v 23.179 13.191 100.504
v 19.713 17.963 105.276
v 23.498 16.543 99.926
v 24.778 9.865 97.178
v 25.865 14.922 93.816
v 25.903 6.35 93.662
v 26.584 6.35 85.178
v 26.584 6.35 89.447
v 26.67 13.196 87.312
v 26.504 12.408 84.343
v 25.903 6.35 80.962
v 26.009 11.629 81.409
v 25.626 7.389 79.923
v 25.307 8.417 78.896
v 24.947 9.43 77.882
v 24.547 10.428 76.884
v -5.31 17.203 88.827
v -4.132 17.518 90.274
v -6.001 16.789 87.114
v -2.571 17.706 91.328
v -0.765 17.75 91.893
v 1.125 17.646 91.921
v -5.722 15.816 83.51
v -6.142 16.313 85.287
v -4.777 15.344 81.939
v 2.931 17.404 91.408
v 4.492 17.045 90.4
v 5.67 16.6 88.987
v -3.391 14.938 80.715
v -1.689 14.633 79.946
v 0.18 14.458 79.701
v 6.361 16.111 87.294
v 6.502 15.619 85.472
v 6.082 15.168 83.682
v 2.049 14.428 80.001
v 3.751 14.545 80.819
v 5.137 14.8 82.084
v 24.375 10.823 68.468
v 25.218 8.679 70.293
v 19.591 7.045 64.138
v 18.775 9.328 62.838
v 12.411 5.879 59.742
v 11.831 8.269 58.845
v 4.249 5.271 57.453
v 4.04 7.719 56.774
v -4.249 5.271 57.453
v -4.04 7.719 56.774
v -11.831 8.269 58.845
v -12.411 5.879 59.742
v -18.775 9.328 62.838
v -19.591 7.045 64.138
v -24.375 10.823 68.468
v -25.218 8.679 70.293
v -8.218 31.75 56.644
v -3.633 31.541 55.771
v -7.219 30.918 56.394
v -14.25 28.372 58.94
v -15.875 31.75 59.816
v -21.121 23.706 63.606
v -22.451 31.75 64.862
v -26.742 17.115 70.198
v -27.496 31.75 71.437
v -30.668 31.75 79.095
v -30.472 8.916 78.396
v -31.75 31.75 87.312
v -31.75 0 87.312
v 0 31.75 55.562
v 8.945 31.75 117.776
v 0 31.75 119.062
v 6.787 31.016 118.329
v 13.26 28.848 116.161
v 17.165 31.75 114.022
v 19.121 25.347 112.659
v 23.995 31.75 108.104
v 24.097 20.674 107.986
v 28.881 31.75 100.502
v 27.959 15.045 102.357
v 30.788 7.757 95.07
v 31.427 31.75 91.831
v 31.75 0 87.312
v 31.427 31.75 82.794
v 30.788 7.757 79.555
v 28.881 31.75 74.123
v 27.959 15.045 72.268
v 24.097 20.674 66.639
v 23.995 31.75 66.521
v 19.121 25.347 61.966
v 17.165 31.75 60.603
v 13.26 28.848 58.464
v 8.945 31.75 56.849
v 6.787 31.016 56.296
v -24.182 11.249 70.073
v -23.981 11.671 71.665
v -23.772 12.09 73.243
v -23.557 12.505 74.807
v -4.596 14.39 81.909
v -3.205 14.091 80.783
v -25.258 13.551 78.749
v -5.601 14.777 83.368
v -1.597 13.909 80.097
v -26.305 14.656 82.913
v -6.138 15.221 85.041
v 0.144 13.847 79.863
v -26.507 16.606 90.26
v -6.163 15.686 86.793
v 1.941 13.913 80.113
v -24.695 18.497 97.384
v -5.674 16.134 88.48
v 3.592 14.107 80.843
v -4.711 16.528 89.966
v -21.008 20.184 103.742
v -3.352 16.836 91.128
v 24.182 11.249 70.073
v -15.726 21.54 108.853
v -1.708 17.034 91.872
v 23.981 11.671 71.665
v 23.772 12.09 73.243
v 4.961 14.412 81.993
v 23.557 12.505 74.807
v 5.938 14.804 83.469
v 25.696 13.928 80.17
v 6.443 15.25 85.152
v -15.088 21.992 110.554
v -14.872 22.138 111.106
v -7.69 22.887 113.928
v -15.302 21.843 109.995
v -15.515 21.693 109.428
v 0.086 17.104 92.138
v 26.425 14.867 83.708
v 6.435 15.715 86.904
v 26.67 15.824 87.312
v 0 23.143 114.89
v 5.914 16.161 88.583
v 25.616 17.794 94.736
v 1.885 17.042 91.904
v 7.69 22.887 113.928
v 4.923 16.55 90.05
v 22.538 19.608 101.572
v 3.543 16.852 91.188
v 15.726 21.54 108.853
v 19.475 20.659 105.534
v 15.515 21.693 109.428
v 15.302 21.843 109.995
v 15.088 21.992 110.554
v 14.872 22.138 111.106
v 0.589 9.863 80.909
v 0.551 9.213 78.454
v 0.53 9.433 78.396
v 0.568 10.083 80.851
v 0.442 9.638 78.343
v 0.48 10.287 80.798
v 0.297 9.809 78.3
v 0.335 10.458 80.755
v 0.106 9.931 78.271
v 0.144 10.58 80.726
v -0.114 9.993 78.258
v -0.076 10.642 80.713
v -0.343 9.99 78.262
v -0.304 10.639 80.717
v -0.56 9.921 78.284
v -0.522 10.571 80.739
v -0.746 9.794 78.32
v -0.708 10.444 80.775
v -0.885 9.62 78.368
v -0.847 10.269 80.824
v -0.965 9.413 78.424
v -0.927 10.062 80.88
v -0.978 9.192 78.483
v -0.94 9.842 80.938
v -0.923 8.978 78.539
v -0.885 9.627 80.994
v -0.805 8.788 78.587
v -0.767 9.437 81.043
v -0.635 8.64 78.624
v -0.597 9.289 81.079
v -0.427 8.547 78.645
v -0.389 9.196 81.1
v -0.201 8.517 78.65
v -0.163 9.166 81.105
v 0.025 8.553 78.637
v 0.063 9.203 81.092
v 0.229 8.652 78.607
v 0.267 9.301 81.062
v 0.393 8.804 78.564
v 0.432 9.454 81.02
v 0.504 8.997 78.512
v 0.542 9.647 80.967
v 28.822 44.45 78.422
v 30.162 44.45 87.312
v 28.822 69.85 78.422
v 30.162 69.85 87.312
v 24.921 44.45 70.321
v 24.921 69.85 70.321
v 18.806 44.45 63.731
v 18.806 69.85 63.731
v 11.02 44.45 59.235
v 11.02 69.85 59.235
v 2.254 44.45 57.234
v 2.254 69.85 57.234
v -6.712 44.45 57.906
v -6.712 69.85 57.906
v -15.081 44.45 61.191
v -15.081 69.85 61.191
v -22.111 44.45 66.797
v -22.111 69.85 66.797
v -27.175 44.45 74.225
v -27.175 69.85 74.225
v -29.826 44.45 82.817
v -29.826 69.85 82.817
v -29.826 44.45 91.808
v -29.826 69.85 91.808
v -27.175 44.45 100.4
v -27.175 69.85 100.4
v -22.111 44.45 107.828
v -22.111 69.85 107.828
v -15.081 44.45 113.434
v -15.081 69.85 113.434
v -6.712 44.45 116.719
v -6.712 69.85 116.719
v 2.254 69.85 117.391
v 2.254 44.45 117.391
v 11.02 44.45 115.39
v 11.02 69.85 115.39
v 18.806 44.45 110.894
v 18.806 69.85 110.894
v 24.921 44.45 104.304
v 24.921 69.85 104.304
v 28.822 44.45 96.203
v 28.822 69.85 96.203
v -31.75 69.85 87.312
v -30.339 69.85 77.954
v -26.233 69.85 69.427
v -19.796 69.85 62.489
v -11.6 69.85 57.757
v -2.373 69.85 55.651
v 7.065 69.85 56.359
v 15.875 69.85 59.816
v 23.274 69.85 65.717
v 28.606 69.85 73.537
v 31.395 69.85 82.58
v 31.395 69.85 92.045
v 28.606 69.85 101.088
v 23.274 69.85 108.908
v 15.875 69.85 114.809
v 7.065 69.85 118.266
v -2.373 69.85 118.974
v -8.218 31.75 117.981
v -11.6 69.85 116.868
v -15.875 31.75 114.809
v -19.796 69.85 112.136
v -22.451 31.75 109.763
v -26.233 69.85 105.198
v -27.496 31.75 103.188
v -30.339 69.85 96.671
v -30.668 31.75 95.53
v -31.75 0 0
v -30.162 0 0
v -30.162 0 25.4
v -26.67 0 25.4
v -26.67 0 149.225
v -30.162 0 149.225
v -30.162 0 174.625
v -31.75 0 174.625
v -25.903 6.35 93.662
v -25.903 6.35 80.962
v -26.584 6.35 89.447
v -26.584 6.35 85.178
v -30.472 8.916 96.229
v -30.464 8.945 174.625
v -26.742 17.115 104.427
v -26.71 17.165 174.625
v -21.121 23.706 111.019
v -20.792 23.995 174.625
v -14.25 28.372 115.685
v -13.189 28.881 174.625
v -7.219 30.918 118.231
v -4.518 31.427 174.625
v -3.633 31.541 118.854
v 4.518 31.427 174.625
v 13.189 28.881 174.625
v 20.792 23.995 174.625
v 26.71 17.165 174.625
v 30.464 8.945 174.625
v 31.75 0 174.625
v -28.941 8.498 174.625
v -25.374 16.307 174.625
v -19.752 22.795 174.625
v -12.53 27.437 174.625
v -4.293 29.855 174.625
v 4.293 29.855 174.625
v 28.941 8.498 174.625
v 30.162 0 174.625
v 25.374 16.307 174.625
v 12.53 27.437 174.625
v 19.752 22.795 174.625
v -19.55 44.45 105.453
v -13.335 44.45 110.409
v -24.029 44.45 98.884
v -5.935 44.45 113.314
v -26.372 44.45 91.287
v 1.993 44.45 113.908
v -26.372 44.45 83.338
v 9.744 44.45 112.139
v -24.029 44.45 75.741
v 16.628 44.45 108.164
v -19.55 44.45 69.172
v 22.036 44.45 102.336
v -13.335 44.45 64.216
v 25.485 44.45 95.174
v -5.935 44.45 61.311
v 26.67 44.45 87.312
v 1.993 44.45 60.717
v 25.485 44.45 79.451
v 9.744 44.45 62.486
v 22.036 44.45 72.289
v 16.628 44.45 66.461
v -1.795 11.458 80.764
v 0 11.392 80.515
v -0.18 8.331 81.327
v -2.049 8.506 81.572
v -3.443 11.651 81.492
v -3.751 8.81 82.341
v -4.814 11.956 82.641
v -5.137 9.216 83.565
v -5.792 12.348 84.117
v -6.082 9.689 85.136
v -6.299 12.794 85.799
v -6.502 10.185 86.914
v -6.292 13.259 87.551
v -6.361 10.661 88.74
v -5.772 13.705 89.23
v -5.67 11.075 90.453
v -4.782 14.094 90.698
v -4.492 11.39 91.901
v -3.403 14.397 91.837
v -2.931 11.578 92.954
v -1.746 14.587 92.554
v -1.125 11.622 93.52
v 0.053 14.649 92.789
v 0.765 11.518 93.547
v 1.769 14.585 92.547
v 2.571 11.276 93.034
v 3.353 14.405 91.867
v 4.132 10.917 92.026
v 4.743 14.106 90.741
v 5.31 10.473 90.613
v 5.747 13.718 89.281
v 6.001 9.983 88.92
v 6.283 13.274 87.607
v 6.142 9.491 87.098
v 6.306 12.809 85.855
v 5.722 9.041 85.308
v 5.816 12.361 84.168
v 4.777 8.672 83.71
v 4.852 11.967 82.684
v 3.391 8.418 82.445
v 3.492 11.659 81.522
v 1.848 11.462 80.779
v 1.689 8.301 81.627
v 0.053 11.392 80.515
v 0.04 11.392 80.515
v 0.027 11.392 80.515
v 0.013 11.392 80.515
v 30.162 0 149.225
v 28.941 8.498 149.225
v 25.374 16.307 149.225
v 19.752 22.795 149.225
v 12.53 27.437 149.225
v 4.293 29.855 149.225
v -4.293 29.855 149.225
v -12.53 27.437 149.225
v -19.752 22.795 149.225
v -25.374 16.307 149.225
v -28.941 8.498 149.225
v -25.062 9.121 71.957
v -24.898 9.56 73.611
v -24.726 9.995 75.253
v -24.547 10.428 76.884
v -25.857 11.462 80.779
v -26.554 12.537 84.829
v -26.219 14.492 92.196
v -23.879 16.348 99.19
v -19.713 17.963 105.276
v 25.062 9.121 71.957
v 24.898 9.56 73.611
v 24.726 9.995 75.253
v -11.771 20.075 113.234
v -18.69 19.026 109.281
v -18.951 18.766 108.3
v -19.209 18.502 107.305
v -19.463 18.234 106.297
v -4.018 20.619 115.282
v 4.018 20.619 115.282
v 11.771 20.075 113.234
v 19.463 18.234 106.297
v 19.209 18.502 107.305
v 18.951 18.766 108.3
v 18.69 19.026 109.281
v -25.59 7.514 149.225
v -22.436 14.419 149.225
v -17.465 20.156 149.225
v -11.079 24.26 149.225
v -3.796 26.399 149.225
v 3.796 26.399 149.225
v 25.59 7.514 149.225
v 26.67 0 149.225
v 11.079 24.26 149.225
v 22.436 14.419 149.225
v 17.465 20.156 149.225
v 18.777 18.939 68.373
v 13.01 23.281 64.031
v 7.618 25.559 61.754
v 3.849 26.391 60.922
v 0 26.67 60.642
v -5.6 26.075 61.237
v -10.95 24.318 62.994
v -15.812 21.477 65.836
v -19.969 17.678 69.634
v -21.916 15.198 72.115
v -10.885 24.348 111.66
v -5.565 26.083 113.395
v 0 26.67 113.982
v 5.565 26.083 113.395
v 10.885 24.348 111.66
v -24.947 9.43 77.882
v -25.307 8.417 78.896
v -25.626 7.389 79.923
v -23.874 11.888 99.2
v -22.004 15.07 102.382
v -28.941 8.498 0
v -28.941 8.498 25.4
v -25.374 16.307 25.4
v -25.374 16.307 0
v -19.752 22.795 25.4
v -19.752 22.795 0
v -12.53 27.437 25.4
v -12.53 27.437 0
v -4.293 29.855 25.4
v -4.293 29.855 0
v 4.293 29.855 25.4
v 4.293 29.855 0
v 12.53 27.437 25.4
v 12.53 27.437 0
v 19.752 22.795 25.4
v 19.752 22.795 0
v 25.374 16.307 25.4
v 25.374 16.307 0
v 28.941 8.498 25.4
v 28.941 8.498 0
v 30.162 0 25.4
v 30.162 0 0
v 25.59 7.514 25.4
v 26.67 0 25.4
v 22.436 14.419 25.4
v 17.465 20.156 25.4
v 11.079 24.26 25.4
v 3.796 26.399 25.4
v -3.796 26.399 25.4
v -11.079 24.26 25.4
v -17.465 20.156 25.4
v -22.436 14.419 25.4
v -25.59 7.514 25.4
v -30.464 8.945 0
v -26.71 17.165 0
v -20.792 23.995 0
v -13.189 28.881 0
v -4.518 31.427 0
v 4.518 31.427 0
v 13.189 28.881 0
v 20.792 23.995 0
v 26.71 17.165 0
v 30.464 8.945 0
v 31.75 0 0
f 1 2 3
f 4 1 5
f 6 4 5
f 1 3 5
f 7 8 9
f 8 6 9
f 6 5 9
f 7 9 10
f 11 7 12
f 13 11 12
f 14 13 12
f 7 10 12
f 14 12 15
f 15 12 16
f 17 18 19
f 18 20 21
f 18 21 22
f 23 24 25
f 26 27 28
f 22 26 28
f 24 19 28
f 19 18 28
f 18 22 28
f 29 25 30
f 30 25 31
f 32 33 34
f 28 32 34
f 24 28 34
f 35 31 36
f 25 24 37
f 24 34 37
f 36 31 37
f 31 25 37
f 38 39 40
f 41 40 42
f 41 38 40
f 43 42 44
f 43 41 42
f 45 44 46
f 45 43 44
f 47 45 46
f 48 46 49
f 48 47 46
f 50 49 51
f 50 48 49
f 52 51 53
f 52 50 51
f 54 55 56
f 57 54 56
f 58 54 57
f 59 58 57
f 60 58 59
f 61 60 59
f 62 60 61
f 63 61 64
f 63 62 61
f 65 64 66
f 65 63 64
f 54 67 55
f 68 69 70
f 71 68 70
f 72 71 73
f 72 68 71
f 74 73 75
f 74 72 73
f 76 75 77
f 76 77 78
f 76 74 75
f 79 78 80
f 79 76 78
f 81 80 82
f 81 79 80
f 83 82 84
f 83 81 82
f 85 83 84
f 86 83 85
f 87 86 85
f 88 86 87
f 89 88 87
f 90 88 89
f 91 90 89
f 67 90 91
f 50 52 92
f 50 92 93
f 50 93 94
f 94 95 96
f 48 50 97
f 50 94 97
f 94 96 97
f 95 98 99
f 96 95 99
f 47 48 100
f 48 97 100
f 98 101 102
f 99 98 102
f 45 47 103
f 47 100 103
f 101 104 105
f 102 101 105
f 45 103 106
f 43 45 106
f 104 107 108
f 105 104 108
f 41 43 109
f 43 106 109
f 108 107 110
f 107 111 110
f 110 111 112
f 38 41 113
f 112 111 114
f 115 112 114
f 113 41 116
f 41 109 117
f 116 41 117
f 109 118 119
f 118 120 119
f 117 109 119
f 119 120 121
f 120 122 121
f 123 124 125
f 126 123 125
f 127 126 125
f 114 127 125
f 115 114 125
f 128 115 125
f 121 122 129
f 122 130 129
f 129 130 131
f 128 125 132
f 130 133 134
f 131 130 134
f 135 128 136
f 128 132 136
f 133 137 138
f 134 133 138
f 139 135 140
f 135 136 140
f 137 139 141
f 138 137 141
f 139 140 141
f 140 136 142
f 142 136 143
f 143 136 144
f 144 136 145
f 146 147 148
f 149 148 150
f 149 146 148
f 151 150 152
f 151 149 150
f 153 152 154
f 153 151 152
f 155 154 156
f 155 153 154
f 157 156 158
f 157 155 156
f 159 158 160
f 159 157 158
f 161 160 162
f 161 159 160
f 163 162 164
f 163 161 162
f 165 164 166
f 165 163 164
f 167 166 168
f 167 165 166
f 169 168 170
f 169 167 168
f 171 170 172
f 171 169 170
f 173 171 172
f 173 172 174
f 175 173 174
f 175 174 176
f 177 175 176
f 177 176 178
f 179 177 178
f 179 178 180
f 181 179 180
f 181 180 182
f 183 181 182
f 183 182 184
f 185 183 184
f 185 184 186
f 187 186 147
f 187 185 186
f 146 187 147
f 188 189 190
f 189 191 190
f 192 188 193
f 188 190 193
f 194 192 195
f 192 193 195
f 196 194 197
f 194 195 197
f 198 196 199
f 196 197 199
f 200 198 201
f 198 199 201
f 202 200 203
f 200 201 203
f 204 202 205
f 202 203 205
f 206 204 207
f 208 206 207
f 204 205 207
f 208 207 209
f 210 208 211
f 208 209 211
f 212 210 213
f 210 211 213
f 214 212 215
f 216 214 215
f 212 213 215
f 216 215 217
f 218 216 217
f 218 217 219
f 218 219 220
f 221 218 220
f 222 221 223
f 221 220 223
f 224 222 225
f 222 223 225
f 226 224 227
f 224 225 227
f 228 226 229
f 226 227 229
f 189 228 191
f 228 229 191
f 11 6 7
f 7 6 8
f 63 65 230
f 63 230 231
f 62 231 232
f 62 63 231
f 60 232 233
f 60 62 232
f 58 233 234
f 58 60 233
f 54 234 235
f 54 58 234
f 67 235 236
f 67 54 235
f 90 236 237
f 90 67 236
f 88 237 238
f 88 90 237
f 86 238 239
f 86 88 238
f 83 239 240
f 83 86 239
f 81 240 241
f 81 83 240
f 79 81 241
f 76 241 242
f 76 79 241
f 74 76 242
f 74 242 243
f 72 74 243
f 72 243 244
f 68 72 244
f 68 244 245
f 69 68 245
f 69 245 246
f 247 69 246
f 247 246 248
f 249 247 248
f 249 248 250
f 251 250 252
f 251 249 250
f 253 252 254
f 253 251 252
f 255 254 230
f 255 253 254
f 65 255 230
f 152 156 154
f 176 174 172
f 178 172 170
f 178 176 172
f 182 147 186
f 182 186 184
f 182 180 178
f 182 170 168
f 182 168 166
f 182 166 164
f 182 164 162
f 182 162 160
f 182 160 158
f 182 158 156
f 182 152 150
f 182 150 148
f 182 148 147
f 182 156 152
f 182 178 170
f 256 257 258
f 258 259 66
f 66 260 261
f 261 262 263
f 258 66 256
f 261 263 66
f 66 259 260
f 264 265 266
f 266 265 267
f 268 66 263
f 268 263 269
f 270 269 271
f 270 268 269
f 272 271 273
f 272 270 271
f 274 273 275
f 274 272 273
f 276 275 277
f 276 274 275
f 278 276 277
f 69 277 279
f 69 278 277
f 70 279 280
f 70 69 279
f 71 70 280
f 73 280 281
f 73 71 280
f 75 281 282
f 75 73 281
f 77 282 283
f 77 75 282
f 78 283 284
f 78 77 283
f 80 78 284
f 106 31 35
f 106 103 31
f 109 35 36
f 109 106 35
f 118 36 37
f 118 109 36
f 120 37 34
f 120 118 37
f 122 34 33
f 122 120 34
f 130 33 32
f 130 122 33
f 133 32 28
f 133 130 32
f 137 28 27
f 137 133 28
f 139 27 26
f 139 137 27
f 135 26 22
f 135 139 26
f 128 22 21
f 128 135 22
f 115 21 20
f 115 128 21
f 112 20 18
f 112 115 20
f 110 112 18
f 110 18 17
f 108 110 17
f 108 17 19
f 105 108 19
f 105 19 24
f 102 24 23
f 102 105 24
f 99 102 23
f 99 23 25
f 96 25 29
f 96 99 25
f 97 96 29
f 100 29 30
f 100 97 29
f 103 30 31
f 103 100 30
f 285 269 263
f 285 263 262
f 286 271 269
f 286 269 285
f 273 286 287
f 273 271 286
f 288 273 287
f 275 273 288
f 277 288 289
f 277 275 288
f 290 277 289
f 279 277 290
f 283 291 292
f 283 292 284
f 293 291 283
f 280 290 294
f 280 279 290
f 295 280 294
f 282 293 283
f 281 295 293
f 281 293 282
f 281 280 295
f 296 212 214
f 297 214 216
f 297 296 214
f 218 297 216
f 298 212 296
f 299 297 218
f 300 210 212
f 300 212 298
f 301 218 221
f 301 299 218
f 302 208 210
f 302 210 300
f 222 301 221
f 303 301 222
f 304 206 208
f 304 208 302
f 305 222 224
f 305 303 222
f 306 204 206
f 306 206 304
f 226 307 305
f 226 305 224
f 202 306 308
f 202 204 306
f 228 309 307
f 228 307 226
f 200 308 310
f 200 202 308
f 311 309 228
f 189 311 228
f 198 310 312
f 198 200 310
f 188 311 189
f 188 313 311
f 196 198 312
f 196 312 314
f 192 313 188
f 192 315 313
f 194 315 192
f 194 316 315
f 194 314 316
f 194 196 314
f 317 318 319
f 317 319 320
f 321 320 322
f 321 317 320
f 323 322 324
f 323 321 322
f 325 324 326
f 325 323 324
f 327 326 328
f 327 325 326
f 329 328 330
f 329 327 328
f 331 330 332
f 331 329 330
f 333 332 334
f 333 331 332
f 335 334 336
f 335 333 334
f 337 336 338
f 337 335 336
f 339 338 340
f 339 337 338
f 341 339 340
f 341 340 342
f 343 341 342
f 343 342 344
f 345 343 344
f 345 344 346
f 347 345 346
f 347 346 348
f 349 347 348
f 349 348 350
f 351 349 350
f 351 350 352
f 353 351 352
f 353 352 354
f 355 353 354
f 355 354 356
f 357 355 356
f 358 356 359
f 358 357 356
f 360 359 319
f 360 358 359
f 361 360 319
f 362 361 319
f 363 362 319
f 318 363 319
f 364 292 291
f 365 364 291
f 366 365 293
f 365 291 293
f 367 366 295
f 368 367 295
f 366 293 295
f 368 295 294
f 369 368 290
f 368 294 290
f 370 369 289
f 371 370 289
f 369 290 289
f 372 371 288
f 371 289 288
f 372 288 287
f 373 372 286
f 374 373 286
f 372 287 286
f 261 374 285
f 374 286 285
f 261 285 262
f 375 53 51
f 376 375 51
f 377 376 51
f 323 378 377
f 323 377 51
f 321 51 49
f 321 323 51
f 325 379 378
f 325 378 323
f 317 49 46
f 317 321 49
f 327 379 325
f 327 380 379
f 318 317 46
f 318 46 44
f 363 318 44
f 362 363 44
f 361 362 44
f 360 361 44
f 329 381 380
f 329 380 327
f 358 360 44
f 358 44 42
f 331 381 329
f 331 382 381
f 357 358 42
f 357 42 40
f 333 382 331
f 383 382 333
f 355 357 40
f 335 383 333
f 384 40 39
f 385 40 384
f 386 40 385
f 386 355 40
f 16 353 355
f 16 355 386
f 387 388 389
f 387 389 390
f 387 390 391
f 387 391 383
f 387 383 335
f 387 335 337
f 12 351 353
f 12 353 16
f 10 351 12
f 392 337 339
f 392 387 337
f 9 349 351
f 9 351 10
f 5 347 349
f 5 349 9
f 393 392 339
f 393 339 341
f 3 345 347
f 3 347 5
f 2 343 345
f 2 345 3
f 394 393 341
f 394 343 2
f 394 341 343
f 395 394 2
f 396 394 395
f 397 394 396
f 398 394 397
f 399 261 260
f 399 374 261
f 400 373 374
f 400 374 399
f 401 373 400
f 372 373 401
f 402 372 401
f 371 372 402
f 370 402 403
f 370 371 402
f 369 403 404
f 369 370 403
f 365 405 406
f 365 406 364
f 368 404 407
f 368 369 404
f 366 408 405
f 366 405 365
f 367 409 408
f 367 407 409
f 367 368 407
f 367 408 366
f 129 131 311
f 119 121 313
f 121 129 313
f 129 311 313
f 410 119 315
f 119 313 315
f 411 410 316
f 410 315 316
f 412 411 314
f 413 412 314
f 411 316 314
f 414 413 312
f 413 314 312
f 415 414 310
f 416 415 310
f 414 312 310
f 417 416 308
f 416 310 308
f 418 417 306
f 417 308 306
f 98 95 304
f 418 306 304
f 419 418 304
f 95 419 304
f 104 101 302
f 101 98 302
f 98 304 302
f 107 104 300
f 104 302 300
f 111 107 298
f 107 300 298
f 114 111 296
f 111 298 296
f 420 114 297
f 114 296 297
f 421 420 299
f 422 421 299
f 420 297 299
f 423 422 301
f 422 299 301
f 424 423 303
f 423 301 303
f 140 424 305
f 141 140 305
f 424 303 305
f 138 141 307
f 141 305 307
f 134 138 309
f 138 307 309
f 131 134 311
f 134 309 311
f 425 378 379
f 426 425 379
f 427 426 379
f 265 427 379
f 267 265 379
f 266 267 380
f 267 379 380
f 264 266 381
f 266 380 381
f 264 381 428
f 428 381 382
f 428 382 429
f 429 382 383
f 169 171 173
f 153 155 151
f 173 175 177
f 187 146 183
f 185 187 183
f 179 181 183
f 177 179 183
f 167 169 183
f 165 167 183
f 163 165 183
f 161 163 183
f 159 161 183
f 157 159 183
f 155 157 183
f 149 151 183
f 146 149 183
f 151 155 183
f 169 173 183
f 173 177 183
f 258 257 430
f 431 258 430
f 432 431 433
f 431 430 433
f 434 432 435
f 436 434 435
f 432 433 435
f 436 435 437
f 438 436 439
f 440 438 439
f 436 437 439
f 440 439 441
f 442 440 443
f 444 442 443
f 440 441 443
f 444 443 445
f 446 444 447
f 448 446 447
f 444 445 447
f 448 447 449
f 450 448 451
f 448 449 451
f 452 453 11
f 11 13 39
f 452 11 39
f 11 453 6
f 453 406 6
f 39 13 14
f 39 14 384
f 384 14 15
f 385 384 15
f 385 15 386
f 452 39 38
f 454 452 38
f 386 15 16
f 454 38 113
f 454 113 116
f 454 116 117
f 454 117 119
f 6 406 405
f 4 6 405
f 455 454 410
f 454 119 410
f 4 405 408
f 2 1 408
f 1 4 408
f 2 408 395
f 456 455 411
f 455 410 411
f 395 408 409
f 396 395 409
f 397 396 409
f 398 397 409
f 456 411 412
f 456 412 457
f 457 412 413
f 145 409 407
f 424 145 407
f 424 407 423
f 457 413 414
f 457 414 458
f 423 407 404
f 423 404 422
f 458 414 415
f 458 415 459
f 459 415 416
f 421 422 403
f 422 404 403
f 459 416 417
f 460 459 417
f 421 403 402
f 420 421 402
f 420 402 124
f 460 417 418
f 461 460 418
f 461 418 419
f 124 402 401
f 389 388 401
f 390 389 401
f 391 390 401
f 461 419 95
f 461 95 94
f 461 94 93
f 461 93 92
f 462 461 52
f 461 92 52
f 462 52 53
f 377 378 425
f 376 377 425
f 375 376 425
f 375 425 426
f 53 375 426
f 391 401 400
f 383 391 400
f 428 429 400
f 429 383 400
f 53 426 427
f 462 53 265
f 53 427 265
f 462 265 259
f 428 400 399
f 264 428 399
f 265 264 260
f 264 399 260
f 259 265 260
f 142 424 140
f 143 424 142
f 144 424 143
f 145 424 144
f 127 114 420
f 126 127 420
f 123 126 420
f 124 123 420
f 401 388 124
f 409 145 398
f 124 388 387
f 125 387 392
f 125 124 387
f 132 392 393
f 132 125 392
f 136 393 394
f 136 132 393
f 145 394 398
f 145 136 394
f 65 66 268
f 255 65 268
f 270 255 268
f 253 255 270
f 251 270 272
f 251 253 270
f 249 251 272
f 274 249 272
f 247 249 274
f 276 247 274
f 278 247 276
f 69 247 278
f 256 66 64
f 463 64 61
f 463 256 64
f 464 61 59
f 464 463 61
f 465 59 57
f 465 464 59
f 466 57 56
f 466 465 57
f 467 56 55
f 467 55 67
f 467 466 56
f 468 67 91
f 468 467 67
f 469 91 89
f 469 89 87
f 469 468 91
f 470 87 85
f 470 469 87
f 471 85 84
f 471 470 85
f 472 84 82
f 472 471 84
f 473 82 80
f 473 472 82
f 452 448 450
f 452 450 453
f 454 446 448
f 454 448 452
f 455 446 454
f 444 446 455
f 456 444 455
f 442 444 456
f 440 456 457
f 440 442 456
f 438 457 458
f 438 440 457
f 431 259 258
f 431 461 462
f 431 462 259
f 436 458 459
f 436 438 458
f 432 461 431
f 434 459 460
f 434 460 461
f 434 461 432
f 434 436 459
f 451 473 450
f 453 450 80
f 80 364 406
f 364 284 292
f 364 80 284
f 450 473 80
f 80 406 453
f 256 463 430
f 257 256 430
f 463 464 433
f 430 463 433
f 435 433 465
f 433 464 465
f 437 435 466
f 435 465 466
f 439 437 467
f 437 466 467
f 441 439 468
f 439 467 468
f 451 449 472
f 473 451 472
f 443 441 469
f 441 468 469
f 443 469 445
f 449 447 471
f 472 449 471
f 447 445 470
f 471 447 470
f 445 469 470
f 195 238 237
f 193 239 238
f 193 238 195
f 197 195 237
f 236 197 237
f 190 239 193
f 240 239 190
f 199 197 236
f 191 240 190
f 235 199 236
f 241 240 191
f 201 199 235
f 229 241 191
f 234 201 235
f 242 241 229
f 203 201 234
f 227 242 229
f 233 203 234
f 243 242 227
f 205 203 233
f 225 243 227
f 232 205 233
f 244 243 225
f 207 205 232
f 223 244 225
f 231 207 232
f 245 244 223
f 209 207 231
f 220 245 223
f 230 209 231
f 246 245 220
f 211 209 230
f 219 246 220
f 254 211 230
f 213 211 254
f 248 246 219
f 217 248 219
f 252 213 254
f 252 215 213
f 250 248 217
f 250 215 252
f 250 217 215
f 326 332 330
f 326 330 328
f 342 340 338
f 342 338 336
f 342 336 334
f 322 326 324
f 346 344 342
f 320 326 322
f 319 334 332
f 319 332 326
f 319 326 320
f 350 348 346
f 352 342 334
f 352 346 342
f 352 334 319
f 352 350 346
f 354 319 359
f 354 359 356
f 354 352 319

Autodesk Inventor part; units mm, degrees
sketch "Sketch1" plane through (0, 0, 0) normal (0, 0, 1) x (1, 0, 0)
  circle A0 centre (0, 0) radius 31.75
  dimension "d0" = 63.5
extrude "mainBody" add sketch "Sketch1" along normal blind 174.625
sketch "Sketch10" plane through (0, 0, 174.625) normal (0, 0, 1) x (1, 0, 0)
  circle A0 centre (0, 0) radius 30.1625 projected
  circle A1 centre (0, 0) radius 31.75 projected
  point P0 (0, 31.75)
ref_plane "Work Plane5" through (0, 31.75, 174.625) normal (0, 1, 0) x (-1, 0, 0)
sketch "Sketch11" plane through (0, 31.75, 174.625) normal (0, 1, 0) x (-1, 0, 0)
  circle A0 centre (0, -87.3125) radius 31.75
  line L0 (31.75, 0) -> (-31.75, 0) projected
  point P0 (0, -174.625)
  dimension "d29" = 87.3125
  dimension "d30" = 63.5
extrude "TBody" add sketch "Sketch11" along normal blind 38.1 and the other way blind 31.75
sketch "Sketch12" plane through (0, 69.85, 87.3125) normal (0, 1, 0) x (1, 0, 0)
  circle A0 centre (0, 0) radius 31.75 projected
  circle A1 centre (0, 0) radius 30.1625
  point P0 (0, 87.3125)
  dimension "d35" = 60.325
extrude "TSocket" cut sketch "Sketch12" against normal blind 25.4 contours A1
sketch "Sketch13" plane through (0, 44.45, 87.3125) normal (0, 1, 0) x (1, 0, 0)
  circle A0 centre (0, 0) radius 30.1625 projected
  circle A1 centre (0, 0) radius 26.67
  point P0 (0, 87.3125)
  dimension "d39" = 53.34
extrude "TTube" cut sketch "Sketch13" against normal blind 38.1 contours A1
sketch "Sketch14" plane through (0, 0, 174.625) normal (0, 0, 1) x (1, 0, 0)
  circle A0 centre (0, 0) radius 31.75 projected
  circle A1 centre (0, 0) radius 26.67
  dimension "d43" = 53.34
extrude "mainTube" cut sketch "Sketch14" against normal blind 177.8 contours A1
sketch "Sketch15" plane through (0, 0, 174.625) normal (0, 0, 1) x (1, 0, 0)
  circle A0 centre (0, 0) radius 26.67 projected
  circle A1 centre (0, 0) radius 31.75 projected
  circle A2 centre (0, 0) radius 30.1625
  dimension "d47" = 60.325
extrude "mainSocket1" cut sketch "Sketch15" against normal blind 25.4 contours A2
sketch "Sketch16" plane through (0, 0, 0) normal (0, 0, -1) x (-1, 0, 0)
  circle A0 centre (0, 0) radius 26.67 projected
  circle A1 centre (0, 0) radius 31.75 projected
  circle A2 centre (0, 0) radius 30.1625
  dimension "d51" = 60.325
extrude "mainSocket2" cut sketch "Sketch16" against normal blind 25.4 contours A2
sketch "Sketch21" plane through (0, 0, 174.625) normal (0, 0, 1) x (1, 0, 0)
  line L0 (-63.5, -52.3875) -> (63.5, -52.3875)
  line L1 (63.5, -52.3875) -> (63.5, 0)
  line L2 (63.5, 0) -> (-63.5, 0)
  line L3 (-63.5, 0) -> (-63.5, -52.3875)
extrude "Extrusion18" cut sketch "Sketch21" against normal blind 203.2
sketch "Sketch23" plane through (-26.67, 0, 25.4) normal (0, -1, 0) x (1, 0, 0)
  line L0 (-3.4925, 149.225) -> (-3.4925, 123.825) projected
  line L1 (-5.08, 149.225) -> (-3.4925, 149.225) projected
  line L2 (-5.08, 61.9125) -> (-5.08, 149.225) projected
  line L3 (-5.08, -25.4) -> (-5.08, 61.9125) projected
  line L4 (-3.4925, -25.4) -> (-5.08, -25.4) projected
  line L5 (-3.4925, 0) -> (-3.4925, -25.4) projected
  line L6 (0, 0) -> (-3.4925, 0) projected
  line L7 (0, 123.825) -> (0, 0) projected
  line L8 (-3.4925, 123.825) -> (0, 123.825) projected
  line L9 (0, 2.288) -> (54.6196, 2.288)
  line L10 (54.6196, 2.288) -> (54.6196, 123.825)
  line L11 (54.6196, 123.825) -> (0, 123.825)
  line L12 (0, 123.825) -> (0, 2.288)
  point P0 (26.67, -25.4)
ref_plane "Work Plane9" through (-26.67, 0, 27.688) normal (0, -0.9665, 0.2565) x (1, 0, 0)
sketch "Sketch24" plane through (-26.67, 0, 27.688) normal (0, -0.9665, 0.2565) x (1, 0, 0)
  circle A0 centre (26.67, 60.0211) radius 30.2
  point P0 (26.67, -26.7614)
extrude "15deg" add sketch "Sketch24" along normal blind 2.54
sketch "Sketch28" plane through (-26.67, -2.455, 28.3397) normal (0, -0.9665, 0.2565) x (1, 0, 0)
  ellipse E0 centre (26.67, 9.5695) end of major axis (26.67, 113.529) minor radius 26.67 (51.8879, 43.4049) -> (51.2161, 50.2241) ccw projected
  ellipse E1 centre (26.67, 61.0148) end of major axis (26.67, 33.4214) minor radius 26.67 (51.2161, 50.2241) -> (46.38, 79.6037) ccw projected
  ellipse E2 centre (26.67, 9.5695) end of major axis (26.67, 113.529) minor radius 26.67 (46.38, 79.6037) -> (45.3561, 83.7461) ccw projected
  arc A0 (45.3561, 83.7461) -> (7.9839, 83.7461) centre (26.67, 60.0211) ccw projected
  ellipse E3 centre (26.67, 9.5695) end of major axis (26.67, 113.529) minor radius 26.67 (7.9839, 83.7461) -> (6.96, 79.6037) ccw projected
  ellipse E4 centre (26.67, 61.0148) end of major axis (26.67, 33.4214) minor radius 26.67 (6.96, 79.6037) -> (2.1239, 50.2241) ccw projected
  ellipse E5 centre (26.67, 9.5695) end of major axis (26.67, 113.529) minor radius 26.67 (2.1239, 50.2241) -> (1.4521, 43.4049) ccw projected
  arc A1 (1.4521, 43.4049) -> (51.8879, 43.4049) centre (26.67, 60.0211) ccw projected
  line L0 (26.67, 90.2212) -> (26.67, 29.8211) construction
  point P0 (26.67, -26.7614)
ref_plane "Work Plane12" through (0, 20.6906, 115.5414) normal (-0.0567, -0.965, 0.2561) x (0, -0.2565, -0.9665)
sketch "Sketch29" plane through (0, 20.6906, 115.5414) normal (-0.0567, -0.965, 0.2561) x (0, -0.2565, -0.9665)
  circle A0 centre (29.8902, 0) radius 6.35
  point P0 (116.9826, -0.5467)
  dimension "d86" = 12.7
extrude "Extrusion23" add sketch "Sketch29" along normal mid plane 6.35
sketch "Sketch30" plane through (-0.18, 9.9586, 87.4647) normal (-0.0567, -0.965, 0.2561) x (0.9983, -0.0586, 0)
  circle A0 centre (0, 0) radius 6.35 projected
  point P0 (0.7638, -87.0907)
  point P1 (0, -6.35)
ref_plane "Work Plane13" through (-0.2754, 8.335, 81.3265) normal (-0.015, -0.2557, -0.9666) x (0.9983, -0.0586, 0)
sketch "Sketch33" plane through (-0.2754, 8.335, 81.3265) normal (-0.015, -0.2557, -0.9666) x (0.9983, -0.0586, 0)
  circle A0 centre (0.0066, -1.6302) radius 0.7668
  point P0 (0.7638, -12.8026)
extrude "Extrusion24" add sketch "Sketch33" along normal blind 2.54
properties part number "0T2split" material "PVC-Piping"
